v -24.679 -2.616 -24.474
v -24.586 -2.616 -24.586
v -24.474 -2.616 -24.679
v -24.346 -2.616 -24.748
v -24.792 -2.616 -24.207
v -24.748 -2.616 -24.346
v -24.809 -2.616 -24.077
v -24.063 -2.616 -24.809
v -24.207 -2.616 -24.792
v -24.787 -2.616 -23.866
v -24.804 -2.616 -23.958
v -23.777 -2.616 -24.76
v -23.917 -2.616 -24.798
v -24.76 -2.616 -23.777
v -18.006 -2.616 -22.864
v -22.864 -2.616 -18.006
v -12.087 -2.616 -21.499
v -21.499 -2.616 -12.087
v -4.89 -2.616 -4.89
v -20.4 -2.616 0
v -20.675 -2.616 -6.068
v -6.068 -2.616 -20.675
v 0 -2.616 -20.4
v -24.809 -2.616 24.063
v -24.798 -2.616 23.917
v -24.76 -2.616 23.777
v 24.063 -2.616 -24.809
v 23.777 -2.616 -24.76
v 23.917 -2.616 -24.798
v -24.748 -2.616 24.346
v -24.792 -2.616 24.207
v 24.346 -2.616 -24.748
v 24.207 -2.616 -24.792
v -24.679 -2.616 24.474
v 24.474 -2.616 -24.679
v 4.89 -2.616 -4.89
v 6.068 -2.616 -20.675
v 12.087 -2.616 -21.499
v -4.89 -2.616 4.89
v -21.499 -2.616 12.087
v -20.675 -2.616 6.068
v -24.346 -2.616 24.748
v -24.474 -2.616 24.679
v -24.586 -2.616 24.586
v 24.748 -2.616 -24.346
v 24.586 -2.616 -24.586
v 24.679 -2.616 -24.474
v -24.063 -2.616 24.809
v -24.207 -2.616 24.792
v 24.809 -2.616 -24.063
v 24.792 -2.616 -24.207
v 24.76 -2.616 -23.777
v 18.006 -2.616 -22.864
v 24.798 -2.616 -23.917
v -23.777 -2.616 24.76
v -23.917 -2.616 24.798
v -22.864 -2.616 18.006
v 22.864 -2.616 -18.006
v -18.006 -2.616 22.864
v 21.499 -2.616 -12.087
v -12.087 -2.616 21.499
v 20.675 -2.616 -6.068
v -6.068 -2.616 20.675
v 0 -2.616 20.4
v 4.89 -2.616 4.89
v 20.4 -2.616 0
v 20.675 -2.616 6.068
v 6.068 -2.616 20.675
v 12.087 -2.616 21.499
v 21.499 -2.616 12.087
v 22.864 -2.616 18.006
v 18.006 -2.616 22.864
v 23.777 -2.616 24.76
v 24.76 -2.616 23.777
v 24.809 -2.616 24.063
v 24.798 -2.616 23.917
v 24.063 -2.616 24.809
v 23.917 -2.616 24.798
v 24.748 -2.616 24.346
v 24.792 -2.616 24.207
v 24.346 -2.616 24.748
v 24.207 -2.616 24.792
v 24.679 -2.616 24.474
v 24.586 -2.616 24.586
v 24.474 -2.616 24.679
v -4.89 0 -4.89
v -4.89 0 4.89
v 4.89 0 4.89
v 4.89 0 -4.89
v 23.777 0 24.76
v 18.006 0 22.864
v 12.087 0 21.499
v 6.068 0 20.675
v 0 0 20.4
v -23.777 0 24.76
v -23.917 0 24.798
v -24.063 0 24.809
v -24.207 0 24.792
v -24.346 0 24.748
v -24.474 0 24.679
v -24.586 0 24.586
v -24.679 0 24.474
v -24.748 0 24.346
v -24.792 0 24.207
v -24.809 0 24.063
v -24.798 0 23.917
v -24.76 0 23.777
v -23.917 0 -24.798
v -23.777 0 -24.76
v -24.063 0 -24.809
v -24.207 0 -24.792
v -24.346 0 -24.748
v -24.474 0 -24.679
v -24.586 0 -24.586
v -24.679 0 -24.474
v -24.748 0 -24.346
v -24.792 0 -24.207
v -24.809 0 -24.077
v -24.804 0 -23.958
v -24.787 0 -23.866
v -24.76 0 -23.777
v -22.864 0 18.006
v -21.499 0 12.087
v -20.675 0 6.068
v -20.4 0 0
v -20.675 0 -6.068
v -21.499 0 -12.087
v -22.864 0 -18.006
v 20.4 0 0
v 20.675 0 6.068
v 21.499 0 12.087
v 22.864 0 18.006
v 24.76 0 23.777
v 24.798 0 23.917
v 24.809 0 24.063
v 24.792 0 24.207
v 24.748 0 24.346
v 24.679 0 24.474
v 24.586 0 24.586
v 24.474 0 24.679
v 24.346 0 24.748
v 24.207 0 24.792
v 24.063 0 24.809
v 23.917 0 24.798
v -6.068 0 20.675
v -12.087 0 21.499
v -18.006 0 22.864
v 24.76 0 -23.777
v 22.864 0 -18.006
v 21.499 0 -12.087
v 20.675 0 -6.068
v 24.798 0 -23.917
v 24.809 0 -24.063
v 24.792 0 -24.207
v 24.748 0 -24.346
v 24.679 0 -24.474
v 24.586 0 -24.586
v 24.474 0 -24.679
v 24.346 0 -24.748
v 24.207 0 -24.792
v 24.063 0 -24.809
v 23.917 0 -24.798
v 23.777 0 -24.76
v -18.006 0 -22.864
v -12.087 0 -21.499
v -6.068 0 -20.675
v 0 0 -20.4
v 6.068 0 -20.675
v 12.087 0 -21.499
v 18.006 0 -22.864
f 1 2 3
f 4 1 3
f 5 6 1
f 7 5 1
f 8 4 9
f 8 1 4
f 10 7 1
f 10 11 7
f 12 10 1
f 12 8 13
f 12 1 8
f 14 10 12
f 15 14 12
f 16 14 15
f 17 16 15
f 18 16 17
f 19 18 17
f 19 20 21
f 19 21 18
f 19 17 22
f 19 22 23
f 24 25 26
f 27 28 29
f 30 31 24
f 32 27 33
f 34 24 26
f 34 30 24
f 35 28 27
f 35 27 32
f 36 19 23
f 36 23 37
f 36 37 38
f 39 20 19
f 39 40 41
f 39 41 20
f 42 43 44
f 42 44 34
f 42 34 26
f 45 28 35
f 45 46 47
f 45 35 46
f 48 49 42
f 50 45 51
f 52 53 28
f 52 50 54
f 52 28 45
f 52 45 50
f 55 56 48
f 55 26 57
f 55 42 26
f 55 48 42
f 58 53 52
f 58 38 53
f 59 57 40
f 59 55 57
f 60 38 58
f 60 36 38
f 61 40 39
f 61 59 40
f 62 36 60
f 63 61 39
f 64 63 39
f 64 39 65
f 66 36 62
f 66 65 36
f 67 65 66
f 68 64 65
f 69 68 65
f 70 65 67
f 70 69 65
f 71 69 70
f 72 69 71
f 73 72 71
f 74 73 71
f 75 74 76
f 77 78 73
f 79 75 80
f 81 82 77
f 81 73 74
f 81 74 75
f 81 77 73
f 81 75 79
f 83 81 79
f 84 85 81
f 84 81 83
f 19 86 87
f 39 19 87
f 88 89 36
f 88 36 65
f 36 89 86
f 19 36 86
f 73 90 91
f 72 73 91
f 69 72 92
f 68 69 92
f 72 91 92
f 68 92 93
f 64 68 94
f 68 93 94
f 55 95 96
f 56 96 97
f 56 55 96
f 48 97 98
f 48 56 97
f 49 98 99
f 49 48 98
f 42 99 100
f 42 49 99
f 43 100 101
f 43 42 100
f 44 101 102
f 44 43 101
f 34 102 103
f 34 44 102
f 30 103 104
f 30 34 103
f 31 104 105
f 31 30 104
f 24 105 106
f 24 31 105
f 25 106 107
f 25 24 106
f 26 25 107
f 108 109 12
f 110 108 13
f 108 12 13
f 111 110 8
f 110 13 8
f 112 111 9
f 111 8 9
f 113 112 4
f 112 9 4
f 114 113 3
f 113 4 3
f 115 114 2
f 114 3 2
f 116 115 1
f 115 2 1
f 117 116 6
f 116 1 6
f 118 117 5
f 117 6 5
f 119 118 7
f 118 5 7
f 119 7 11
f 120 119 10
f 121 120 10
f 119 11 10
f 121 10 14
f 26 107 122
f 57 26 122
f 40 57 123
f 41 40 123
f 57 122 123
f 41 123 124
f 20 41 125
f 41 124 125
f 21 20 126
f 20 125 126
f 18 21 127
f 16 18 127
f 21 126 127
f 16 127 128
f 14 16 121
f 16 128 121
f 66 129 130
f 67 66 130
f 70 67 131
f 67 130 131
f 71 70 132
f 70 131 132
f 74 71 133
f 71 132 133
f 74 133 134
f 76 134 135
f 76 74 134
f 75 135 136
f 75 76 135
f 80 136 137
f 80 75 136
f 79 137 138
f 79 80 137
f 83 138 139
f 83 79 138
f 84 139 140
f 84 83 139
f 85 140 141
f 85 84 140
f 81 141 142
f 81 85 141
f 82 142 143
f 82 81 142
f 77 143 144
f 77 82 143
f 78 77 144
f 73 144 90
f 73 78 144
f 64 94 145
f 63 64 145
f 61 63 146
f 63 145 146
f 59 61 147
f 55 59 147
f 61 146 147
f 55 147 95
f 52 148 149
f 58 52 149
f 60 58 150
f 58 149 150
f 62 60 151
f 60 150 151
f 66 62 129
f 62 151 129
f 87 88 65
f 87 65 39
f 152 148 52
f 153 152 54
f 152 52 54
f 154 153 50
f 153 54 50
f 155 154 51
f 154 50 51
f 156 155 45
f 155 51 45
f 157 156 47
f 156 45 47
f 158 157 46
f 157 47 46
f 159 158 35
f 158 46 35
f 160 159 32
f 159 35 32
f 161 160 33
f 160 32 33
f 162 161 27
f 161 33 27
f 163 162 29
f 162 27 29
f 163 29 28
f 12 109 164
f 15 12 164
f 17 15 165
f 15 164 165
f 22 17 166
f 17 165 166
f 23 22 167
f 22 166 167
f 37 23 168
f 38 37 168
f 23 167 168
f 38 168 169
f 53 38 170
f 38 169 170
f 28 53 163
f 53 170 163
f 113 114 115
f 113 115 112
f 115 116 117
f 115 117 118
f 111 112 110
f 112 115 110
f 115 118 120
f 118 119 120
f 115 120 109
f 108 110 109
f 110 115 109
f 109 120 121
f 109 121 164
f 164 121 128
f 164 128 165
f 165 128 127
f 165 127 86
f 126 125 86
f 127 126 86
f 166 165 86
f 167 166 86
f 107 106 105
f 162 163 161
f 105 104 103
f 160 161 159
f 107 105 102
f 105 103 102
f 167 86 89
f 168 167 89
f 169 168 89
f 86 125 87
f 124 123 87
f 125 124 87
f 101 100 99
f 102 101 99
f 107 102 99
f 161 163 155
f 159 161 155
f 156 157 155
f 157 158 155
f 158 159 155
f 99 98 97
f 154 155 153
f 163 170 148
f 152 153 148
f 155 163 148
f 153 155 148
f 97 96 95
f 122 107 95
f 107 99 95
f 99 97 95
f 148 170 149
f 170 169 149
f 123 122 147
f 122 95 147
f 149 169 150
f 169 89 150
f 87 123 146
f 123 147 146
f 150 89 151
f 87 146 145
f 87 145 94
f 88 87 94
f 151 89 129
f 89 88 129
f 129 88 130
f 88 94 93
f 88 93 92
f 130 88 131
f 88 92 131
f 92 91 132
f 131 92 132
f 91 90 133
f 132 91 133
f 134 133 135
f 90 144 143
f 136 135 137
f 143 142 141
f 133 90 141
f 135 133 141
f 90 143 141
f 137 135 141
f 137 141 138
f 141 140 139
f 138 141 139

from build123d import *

# Parameters (mm, degrees)
F1_DEPTH = 2.6162
F2_W     = 9.779
F2_H     = 9.779
F3_DEPTH = 25
F4_R     = 0.762


with BuildPart() as f1:
    # F0 (on Front) → F1 (new body)
    with BuildSketch(Plane.XZ):
        with BuildLine():
            ThreePointArc((20.4, 0), (21.66188, 12.943724), (25.4, 25.4))
            ThreePointArc((25.4, 25.4), (12.943724, 21.66188), (0, 20.4))
            ThreePointArc((0, 20.4), (-12.943724, 21.66188), (-25.4, 25.4))
            ThreePointArc((-25.4, 25.4), (-20.4, 0), (-25.4, -25.4))
            ThreePointArc((-25.4, -25.4), (0, -20.4), (25.4, -25.4))
            ThreePointArc((25.4, -25.4), (21.66188, -12.943724), (20.4, 0))
        make_face()
    extrude(amount=F1_DEPTH)

    # F2 (on face) → F3 (cut)
    with BuildSketch(Plane(origin=(0, 0, 0), x_dir=(-1, 0, 0), z_dir=(0, 1, 0))):
        Rectangle(F2_W, F2_H)
    extrude(amount=-F3_DEPTH, mode=Mode.SUBTRACT)

    # F4
    f4_edges = [f1.edges().sort_by_distance(p)[0] for p in [
        (25.4, -1.3081, 25.4),
        (-25.4, -1.3081, 25.4),
        (-25.4, -1.3081, -25.4),
        (25.4, -1.3081, -25.4),
    ]]
    fillet(f4_edges, radius=F4_R)


solid = f1.part
